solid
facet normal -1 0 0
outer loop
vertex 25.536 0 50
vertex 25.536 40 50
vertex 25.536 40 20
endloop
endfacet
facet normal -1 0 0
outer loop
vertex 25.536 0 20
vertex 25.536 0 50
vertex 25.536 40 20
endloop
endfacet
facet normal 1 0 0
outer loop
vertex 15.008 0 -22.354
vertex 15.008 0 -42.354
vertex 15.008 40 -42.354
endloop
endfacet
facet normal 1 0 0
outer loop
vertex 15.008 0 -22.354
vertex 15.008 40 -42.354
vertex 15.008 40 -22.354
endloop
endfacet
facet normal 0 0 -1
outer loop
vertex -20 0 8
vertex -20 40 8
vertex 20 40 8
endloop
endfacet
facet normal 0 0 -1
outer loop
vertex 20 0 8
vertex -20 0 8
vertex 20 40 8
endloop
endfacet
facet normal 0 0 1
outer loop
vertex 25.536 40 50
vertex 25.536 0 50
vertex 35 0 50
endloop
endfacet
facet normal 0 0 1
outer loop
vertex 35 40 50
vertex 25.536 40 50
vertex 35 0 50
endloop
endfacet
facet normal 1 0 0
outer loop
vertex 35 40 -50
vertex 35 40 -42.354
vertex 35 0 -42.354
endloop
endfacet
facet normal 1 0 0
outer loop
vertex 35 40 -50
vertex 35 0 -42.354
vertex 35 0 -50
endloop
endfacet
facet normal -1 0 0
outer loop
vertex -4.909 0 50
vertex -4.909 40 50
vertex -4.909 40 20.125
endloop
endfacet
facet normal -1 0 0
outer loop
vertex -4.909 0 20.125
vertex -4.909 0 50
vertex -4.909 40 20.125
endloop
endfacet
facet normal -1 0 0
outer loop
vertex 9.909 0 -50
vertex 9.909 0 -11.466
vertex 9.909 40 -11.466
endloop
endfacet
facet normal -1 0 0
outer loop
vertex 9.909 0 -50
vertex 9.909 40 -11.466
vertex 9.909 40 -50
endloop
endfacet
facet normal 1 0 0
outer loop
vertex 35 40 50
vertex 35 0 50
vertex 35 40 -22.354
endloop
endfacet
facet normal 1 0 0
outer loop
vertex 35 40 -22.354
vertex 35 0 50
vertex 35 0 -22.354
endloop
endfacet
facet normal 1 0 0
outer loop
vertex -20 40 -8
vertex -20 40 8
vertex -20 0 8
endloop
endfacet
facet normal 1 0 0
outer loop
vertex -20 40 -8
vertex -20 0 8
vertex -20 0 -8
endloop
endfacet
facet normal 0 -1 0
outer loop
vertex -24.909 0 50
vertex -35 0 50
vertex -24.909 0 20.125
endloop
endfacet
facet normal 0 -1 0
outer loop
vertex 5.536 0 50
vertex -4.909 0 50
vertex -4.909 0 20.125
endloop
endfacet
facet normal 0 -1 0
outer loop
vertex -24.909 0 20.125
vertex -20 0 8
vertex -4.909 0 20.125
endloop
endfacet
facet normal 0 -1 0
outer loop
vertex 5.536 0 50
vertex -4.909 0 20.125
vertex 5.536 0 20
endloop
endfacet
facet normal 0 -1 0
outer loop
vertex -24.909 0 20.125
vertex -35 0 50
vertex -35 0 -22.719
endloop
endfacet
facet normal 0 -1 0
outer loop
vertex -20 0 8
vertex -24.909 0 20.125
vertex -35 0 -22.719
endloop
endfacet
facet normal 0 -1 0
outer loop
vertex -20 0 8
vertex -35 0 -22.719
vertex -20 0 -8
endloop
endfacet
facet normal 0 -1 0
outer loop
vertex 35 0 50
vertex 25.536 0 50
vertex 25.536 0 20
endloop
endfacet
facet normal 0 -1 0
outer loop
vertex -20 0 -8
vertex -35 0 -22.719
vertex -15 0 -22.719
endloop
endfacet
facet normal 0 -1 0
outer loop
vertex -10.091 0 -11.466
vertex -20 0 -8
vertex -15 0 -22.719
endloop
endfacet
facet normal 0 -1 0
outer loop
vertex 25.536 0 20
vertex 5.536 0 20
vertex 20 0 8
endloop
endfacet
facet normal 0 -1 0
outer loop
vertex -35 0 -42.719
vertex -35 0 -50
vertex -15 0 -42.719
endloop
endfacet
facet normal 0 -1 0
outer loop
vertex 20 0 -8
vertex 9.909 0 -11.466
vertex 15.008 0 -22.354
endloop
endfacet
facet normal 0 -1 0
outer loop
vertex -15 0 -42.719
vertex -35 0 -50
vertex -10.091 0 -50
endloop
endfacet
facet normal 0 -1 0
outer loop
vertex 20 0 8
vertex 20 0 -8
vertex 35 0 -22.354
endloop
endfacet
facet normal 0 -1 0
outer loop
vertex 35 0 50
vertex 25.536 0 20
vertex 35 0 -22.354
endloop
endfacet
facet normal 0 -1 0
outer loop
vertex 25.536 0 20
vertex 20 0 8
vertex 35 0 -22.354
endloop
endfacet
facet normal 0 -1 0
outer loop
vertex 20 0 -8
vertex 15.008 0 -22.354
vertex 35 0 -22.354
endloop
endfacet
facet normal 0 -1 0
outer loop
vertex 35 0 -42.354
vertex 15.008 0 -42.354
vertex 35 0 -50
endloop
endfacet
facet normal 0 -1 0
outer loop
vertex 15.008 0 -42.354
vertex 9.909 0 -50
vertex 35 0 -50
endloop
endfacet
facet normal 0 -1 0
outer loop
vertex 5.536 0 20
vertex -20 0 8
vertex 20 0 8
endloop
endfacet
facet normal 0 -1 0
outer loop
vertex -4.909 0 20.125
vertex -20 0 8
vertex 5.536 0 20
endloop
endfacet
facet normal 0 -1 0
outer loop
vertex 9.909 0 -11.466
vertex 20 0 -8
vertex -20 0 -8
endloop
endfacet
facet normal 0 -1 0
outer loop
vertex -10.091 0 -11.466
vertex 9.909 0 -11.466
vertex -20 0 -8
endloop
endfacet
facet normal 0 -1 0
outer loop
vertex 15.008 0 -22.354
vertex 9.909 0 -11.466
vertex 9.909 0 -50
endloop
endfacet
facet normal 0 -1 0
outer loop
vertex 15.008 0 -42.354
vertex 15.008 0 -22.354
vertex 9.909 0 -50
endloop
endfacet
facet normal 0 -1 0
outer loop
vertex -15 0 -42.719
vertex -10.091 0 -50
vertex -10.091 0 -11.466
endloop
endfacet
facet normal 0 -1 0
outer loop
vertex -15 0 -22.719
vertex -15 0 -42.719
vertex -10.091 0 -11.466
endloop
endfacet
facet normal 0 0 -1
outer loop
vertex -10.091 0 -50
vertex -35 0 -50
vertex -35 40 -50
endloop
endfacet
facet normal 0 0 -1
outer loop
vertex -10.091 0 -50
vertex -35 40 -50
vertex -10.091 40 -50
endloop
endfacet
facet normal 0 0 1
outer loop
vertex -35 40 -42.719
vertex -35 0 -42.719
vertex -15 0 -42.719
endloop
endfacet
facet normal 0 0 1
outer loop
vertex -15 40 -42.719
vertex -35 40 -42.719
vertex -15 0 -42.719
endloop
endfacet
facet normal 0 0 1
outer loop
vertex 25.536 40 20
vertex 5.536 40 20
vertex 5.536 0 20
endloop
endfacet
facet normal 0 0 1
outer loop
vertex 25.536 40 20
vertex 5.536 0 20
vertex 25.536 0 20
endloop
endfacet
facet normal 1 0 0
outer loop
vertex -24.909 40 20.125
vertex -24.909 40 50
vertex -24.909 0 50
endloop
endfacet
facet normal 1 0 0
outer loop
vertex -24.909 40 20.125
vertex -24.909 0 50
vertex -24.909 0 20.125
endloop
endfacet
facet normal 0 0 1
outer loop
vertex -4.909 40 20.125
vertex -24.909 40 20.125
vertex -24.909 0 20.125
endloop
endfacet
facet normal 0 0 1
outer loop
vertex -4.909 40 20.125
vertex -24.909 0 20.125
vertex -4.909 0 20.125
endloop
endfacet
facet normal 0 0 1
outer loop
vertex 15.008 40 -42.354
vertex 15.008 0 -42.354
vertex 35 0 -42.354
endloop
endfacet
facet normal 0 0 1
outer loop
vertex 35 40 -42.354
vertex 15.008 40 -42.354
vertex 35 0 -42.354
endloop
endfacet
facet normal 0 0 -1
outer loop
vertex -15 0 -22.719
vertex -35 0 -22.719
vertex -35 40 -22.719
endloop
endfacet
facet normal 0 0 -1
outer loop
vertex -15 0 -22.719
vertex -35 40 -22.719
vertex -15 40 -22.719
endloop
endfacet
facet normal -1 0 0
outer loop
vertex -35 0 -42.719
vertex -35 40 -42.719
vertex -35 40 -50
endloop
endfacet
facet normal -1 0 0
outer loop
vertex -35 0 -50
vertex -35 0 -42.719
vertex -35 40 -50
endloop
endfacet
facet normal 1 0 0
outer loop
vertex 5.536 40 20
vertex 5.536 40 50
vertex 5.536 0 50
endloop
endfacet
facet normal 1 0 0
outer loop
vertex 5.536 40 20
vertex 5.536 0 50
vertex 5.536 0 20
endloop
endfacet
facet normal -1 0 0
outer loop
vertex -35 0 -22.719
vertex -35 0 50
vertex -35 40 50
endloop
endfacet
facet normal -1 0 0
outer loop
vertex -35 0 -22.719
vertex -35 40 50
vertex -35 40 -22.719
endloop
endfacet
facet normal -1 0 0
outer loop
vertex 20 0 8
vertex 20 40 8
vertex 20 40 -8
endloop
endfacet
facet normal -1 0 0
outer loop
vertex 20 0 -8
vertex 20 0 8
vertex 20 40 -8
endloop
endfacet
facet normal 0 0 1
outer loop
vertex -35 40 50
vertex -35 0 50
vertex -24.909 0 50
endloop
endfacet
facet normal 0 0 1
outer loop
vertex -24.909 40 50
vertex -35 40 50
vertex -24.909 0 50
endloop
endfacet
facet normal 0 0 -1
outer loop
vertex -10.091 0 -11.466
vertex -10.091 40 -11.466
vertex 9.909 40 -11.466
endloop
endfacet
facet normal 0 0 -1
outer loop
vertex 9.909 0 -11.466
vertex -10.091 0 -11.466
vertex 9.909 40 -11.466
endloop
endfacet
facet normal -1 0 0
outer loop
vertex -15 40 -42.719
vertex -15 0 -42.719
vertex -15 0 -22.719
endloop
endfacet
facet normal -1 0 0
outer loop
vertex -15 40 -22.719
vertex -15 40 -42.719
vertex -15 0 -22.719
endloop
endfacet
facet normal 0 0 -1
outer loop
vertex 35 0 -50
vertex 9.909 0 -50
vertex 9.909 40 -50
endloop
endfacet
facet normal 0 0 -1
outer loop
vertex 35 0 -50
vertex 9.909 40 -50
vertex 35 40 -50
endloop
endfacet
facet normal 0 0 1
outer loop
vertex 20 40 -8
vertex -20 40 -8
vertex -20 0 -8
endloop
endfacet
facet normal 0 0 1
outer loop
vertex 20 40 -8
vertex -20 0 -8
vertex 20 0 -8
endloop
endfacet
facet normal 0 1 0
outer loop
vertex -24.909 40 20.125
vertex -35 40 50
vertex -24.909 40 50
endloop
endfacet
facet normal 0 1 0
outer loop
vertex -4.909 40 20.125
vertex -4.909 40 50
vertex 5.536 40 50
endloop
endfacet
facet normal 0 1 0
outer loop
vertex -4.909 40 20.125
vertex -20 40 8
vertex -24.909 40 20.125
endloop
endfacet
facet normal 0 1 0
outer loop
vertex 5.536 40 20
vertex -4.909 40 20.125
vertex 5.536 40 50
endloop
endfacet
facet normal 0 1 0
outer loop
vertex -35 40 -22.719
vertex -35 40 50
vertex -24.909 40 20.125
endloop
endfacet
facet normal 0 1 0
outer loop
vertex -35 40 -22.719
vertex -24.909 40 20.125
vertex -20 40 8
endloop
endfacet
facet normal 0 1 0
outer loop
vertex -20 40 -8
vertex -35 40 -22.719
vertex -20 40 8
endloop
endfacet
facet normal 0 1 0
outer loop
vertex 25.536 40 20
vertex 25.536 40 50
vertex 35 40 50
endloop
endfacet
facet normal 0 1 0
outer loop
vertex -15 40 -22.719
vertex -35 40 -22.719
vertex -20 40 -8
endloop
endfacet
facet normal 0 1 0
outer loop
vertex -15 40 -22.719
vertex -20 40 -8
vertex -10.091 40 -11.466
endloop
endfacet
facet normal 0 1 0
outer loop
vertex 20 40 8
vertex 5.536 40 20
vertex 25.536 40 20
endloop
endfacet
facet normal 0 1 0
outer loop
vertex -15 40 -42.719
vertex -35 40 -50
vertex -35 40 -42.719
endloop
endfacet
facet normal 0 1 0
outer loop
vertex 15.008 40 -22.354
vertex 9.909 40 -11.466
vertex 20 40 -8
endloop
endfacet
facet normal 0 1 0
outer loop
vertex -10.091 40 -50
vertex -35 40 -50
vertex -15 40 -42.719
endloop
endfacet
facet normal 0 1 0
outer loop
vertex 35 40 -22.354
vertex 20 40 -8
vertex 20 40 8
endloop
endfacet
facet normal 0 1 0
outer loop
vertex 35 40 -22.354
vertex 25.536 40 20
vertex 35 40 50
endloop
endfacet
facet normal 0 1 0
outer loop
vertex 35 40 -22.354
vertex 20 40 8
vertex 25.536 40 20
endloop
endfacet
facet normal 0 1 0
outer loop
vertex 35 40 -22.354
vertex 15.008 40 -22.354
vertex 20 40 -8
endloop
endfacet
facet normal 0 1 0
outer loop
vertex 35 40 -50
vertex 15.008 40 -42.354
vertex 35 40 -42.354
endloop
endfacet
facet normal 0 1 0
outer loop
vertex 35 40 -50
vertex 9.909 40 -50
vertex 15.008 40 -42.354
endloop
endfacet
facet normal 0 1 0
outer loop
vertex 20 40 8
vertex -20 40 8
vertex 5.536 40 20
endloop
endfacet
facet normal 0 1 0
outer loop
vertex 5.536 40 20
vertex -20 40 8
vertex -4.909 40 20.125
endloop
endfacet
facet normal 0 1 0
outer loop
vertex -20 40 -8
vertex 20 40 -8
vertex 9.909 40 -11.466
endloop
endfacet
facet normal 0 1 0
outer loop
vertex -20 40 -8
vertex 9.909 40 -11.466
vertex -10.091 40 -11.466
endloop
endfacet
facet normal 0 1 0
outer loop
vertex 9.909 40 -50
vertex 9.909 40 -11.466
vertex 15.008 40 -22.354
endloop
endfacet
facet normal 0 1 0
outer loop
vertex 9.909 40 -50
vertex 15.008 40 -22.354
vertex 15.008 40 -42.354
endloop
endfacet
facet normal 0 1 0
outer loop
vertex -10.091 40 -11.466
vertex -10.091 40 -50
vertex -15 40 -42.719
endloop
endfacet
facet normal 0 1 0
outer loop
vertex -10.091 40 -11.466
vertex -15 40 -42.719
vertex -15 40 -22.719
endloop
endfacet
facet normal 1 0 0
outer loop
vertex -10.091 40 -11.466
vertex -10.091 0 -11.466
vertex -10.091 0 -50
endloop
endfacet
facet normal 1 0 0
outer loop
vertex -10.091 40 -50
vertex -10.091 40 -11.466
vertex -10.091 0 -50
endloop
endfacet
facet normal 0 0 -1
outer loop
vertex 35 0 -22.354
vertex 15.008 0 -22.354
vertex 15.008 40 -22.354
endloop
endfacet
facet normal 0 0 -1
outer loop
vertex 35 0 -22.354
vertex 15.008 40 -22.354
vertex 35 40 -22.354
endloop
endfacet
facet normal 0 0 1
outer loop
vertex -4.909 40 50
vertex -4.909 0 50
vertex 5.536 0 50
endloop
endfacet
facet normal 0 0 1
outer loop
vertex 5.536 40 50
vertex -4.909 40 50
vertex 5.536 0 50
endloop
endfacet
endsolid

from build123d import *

# Parameters (mm, degrees)
SKETCH_1_W          = 70
SKETCH_1_H          = 100
EXTRUDE_1_DEPTH     = 40
SKETCH_3_W          = 20
SKETCH_3_H          = 20
CUT_EXTRUDE_1_DEPTH = 40
SKETCH_5_W          = 20
SKETCH_5_H          = 30
SKETCH_5_H_2        = 29.917444877
CUT_EXTRUDE_4_DEPTH = 40
SKETCH_13_W         = 40
SKETCH_13_H         = 16
CUT_EXTRUDE_5_DEPTH = 40
SKETCH_15_W         = 20
SKETCH_15_H         = 40
CUT_EXTRUDE_6_DEPTH = 40


with BuildPart() as part:
    # 草图1 → 凸台-拉伸1 (new body)
    with BuildSketch(Plane(origin=(0, 0, 0), x_dir=(1, 0, 0), z_dir=(0, 1, 0))):
        Rectangle(SKETCH_1_W, SKETCH_1_H)
    extrude(amount=EXTRUDE_1_DEPTH)

    # 草图3 → 切除-拉伸1 (cut)
    with BuildSketch(Plane.XZ):
        with Locations((-25, -32.719295767)):
            Rectangle(SKETCH_3_W, SKETCH_3_H)
        with Locations((25.007645878, -32.353993134)):
            Rectangle(SKETCH_3_W, SKETCH_3_H)
    extrude(amount=-CUT_EXTRUDE_1_DEPTH, mode=Mode.SUBTRACT)

    # 草图5 → 切除-拉伸4 (cut)
    with BuildSketch(Plane(origin=(0, 40, 0), x_dir=(1, 0, 0), z_dir=(0, 1, 0))):
        with Locations((15.536368654, -35)):
            Rectangle(SKETCH_5_W, SKETCH_5_H)
        with Locations((-14.909129338, -35.083562285)):
            Rectangle(SKETCH_5_W, SKETCH_5_H_2)
    extrude(amount=-CUT_EXTRUDE_4_DEPTH, mode=Mode.SUBTRACT)

    # 草图13 → 切除-拉伸5 (cut)
    with BuildSketch(Plane(origin=(0, 40, 0), x_dir=(1, 0, 0), z_dir=(0, 1, 0))):
        Rectangle(SKETCH_13_W, SKETCH_13_H)
    extrude(amount=-CUT_EXTRUDE_5_DEPTH, mode=Mode.SUBTRACT)

    # 草图15 → 切除-拉伸6 (cut)
    with BuildSketch(Plane(origin=(0, 40, 0), x_dir=(1, 0, 0), z_dir=(0, 1, 0))):
        with Locations((-0.091013634, 31.465991837)):
            Rectangle(SKETCH_15_W, SKETCH_15_H)
    extrude(amount=-CUT_EXTRUDE_6_DEPTH, mode=Mode.SUBTRACT)


solid = part.part
